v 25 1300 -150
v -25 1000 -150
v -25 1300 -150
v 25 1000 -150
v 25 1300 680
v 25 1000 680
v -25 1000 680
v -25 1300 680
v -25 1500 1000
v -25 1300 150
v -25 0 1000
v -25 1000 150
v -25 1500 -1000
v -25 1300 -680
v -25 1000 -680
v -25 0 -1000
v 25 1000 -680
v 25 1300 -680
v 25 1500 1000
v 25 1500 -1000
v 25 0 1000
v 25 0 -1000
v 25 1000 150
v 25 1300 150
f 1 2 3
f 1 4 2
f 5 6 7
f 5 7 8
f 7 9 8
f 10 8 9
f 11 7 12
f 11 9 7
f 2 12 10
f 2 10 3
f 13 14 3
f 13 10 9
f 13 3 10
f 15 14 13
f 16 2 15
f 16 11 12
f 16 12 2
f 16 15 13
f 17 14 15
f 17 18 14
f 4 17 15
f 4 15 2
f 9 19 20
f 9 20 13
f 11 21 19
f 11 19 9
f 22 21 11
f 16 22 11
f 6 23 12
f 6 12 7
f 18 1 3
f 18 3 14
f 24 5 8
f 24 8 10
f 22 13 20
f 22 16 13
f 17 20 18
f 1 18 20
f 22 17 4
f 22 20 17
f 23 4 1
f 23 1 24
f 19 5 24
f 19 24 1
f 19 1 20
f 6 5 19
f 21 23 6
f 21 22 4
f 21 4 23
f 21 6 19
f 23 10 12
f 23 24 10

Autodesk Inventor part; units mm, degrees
ref_plane "YZ Plane" through (0, 0, 0) normal (1, 0, 0) x (0, 1, 0)
ref_plane "XZ Plane" through (0, 0, 0) normal (0, 1, 0) x (-1, 0, 0)
ref_plane "XY Plane" through (0, 0, 0) normal (0, 0, 1) x (1, 0, 0)
sketch "Sketch1" plane through (0, 0, 0) normal (0, 1, 0) x (-1, 0, 0)
  line L0 (-25, 1000) -> (25, 1000)
  line L1 (25, 1000) -> (25, -1000)
  line L2 (25, -1000) -> (-25, -1000)
  line L3 (-25, -1000) -> (-25, 1000)
  line L4 (-25, 1000) -> (25, -1000) construction
  line L5 (25, 1000) -> (-25, -1000) construction
  point P0 (0, 0)
  dimension "d0" = 50
  dimension "d1" = 2000
extrude "Extrusion1" add sketch "Sketch1" along normal blind 1500
sketch "Sketch2" plane through (25, 0, 1000) normal (1, 0, 0) x (0, 0, -1)
  line L0 (2000, 1500) -> (0, 1500) projected
  line L1 (1000, 1500) -> (1000, 0)
sketch "Sketch3" plane through (25, 0, 1000) normal (1, 0, 0) x (0, 0, -1)
  line L0 (1150, 1300) -> (1680, 1300)
  line L1 (1680, 1300) -> (1680, 1000)
  line L2 (1680, 1000) -> (1150, 1000)
  line L3 (1150, 1000) -> (1150, 1300)
  line L4 (2000, 0) -> (2000, 1500) projected
  line L5 (1000, 1500) -> (1000, 0) projected
  line L6 (0, 0) -> (2000, 0) projected
  dimension "d4" = 530
  dimension "d5" = 300
  dimension "d6" = 320
  dimension "d7" = 150
  dimension "d8" = 1000
extrude "Extrusion2" cut sketch "Sketch3" against normal through all
ref_plane "Work Plane1" through (-25, 0, 0) normal (0, 0, 1) x (1, 0, 0)
mirror "Mirror1" about plane through (-25, 0, 0) normal (0, 0, 1) of "Extrusion2"
properties part number "LCD PANEL"
